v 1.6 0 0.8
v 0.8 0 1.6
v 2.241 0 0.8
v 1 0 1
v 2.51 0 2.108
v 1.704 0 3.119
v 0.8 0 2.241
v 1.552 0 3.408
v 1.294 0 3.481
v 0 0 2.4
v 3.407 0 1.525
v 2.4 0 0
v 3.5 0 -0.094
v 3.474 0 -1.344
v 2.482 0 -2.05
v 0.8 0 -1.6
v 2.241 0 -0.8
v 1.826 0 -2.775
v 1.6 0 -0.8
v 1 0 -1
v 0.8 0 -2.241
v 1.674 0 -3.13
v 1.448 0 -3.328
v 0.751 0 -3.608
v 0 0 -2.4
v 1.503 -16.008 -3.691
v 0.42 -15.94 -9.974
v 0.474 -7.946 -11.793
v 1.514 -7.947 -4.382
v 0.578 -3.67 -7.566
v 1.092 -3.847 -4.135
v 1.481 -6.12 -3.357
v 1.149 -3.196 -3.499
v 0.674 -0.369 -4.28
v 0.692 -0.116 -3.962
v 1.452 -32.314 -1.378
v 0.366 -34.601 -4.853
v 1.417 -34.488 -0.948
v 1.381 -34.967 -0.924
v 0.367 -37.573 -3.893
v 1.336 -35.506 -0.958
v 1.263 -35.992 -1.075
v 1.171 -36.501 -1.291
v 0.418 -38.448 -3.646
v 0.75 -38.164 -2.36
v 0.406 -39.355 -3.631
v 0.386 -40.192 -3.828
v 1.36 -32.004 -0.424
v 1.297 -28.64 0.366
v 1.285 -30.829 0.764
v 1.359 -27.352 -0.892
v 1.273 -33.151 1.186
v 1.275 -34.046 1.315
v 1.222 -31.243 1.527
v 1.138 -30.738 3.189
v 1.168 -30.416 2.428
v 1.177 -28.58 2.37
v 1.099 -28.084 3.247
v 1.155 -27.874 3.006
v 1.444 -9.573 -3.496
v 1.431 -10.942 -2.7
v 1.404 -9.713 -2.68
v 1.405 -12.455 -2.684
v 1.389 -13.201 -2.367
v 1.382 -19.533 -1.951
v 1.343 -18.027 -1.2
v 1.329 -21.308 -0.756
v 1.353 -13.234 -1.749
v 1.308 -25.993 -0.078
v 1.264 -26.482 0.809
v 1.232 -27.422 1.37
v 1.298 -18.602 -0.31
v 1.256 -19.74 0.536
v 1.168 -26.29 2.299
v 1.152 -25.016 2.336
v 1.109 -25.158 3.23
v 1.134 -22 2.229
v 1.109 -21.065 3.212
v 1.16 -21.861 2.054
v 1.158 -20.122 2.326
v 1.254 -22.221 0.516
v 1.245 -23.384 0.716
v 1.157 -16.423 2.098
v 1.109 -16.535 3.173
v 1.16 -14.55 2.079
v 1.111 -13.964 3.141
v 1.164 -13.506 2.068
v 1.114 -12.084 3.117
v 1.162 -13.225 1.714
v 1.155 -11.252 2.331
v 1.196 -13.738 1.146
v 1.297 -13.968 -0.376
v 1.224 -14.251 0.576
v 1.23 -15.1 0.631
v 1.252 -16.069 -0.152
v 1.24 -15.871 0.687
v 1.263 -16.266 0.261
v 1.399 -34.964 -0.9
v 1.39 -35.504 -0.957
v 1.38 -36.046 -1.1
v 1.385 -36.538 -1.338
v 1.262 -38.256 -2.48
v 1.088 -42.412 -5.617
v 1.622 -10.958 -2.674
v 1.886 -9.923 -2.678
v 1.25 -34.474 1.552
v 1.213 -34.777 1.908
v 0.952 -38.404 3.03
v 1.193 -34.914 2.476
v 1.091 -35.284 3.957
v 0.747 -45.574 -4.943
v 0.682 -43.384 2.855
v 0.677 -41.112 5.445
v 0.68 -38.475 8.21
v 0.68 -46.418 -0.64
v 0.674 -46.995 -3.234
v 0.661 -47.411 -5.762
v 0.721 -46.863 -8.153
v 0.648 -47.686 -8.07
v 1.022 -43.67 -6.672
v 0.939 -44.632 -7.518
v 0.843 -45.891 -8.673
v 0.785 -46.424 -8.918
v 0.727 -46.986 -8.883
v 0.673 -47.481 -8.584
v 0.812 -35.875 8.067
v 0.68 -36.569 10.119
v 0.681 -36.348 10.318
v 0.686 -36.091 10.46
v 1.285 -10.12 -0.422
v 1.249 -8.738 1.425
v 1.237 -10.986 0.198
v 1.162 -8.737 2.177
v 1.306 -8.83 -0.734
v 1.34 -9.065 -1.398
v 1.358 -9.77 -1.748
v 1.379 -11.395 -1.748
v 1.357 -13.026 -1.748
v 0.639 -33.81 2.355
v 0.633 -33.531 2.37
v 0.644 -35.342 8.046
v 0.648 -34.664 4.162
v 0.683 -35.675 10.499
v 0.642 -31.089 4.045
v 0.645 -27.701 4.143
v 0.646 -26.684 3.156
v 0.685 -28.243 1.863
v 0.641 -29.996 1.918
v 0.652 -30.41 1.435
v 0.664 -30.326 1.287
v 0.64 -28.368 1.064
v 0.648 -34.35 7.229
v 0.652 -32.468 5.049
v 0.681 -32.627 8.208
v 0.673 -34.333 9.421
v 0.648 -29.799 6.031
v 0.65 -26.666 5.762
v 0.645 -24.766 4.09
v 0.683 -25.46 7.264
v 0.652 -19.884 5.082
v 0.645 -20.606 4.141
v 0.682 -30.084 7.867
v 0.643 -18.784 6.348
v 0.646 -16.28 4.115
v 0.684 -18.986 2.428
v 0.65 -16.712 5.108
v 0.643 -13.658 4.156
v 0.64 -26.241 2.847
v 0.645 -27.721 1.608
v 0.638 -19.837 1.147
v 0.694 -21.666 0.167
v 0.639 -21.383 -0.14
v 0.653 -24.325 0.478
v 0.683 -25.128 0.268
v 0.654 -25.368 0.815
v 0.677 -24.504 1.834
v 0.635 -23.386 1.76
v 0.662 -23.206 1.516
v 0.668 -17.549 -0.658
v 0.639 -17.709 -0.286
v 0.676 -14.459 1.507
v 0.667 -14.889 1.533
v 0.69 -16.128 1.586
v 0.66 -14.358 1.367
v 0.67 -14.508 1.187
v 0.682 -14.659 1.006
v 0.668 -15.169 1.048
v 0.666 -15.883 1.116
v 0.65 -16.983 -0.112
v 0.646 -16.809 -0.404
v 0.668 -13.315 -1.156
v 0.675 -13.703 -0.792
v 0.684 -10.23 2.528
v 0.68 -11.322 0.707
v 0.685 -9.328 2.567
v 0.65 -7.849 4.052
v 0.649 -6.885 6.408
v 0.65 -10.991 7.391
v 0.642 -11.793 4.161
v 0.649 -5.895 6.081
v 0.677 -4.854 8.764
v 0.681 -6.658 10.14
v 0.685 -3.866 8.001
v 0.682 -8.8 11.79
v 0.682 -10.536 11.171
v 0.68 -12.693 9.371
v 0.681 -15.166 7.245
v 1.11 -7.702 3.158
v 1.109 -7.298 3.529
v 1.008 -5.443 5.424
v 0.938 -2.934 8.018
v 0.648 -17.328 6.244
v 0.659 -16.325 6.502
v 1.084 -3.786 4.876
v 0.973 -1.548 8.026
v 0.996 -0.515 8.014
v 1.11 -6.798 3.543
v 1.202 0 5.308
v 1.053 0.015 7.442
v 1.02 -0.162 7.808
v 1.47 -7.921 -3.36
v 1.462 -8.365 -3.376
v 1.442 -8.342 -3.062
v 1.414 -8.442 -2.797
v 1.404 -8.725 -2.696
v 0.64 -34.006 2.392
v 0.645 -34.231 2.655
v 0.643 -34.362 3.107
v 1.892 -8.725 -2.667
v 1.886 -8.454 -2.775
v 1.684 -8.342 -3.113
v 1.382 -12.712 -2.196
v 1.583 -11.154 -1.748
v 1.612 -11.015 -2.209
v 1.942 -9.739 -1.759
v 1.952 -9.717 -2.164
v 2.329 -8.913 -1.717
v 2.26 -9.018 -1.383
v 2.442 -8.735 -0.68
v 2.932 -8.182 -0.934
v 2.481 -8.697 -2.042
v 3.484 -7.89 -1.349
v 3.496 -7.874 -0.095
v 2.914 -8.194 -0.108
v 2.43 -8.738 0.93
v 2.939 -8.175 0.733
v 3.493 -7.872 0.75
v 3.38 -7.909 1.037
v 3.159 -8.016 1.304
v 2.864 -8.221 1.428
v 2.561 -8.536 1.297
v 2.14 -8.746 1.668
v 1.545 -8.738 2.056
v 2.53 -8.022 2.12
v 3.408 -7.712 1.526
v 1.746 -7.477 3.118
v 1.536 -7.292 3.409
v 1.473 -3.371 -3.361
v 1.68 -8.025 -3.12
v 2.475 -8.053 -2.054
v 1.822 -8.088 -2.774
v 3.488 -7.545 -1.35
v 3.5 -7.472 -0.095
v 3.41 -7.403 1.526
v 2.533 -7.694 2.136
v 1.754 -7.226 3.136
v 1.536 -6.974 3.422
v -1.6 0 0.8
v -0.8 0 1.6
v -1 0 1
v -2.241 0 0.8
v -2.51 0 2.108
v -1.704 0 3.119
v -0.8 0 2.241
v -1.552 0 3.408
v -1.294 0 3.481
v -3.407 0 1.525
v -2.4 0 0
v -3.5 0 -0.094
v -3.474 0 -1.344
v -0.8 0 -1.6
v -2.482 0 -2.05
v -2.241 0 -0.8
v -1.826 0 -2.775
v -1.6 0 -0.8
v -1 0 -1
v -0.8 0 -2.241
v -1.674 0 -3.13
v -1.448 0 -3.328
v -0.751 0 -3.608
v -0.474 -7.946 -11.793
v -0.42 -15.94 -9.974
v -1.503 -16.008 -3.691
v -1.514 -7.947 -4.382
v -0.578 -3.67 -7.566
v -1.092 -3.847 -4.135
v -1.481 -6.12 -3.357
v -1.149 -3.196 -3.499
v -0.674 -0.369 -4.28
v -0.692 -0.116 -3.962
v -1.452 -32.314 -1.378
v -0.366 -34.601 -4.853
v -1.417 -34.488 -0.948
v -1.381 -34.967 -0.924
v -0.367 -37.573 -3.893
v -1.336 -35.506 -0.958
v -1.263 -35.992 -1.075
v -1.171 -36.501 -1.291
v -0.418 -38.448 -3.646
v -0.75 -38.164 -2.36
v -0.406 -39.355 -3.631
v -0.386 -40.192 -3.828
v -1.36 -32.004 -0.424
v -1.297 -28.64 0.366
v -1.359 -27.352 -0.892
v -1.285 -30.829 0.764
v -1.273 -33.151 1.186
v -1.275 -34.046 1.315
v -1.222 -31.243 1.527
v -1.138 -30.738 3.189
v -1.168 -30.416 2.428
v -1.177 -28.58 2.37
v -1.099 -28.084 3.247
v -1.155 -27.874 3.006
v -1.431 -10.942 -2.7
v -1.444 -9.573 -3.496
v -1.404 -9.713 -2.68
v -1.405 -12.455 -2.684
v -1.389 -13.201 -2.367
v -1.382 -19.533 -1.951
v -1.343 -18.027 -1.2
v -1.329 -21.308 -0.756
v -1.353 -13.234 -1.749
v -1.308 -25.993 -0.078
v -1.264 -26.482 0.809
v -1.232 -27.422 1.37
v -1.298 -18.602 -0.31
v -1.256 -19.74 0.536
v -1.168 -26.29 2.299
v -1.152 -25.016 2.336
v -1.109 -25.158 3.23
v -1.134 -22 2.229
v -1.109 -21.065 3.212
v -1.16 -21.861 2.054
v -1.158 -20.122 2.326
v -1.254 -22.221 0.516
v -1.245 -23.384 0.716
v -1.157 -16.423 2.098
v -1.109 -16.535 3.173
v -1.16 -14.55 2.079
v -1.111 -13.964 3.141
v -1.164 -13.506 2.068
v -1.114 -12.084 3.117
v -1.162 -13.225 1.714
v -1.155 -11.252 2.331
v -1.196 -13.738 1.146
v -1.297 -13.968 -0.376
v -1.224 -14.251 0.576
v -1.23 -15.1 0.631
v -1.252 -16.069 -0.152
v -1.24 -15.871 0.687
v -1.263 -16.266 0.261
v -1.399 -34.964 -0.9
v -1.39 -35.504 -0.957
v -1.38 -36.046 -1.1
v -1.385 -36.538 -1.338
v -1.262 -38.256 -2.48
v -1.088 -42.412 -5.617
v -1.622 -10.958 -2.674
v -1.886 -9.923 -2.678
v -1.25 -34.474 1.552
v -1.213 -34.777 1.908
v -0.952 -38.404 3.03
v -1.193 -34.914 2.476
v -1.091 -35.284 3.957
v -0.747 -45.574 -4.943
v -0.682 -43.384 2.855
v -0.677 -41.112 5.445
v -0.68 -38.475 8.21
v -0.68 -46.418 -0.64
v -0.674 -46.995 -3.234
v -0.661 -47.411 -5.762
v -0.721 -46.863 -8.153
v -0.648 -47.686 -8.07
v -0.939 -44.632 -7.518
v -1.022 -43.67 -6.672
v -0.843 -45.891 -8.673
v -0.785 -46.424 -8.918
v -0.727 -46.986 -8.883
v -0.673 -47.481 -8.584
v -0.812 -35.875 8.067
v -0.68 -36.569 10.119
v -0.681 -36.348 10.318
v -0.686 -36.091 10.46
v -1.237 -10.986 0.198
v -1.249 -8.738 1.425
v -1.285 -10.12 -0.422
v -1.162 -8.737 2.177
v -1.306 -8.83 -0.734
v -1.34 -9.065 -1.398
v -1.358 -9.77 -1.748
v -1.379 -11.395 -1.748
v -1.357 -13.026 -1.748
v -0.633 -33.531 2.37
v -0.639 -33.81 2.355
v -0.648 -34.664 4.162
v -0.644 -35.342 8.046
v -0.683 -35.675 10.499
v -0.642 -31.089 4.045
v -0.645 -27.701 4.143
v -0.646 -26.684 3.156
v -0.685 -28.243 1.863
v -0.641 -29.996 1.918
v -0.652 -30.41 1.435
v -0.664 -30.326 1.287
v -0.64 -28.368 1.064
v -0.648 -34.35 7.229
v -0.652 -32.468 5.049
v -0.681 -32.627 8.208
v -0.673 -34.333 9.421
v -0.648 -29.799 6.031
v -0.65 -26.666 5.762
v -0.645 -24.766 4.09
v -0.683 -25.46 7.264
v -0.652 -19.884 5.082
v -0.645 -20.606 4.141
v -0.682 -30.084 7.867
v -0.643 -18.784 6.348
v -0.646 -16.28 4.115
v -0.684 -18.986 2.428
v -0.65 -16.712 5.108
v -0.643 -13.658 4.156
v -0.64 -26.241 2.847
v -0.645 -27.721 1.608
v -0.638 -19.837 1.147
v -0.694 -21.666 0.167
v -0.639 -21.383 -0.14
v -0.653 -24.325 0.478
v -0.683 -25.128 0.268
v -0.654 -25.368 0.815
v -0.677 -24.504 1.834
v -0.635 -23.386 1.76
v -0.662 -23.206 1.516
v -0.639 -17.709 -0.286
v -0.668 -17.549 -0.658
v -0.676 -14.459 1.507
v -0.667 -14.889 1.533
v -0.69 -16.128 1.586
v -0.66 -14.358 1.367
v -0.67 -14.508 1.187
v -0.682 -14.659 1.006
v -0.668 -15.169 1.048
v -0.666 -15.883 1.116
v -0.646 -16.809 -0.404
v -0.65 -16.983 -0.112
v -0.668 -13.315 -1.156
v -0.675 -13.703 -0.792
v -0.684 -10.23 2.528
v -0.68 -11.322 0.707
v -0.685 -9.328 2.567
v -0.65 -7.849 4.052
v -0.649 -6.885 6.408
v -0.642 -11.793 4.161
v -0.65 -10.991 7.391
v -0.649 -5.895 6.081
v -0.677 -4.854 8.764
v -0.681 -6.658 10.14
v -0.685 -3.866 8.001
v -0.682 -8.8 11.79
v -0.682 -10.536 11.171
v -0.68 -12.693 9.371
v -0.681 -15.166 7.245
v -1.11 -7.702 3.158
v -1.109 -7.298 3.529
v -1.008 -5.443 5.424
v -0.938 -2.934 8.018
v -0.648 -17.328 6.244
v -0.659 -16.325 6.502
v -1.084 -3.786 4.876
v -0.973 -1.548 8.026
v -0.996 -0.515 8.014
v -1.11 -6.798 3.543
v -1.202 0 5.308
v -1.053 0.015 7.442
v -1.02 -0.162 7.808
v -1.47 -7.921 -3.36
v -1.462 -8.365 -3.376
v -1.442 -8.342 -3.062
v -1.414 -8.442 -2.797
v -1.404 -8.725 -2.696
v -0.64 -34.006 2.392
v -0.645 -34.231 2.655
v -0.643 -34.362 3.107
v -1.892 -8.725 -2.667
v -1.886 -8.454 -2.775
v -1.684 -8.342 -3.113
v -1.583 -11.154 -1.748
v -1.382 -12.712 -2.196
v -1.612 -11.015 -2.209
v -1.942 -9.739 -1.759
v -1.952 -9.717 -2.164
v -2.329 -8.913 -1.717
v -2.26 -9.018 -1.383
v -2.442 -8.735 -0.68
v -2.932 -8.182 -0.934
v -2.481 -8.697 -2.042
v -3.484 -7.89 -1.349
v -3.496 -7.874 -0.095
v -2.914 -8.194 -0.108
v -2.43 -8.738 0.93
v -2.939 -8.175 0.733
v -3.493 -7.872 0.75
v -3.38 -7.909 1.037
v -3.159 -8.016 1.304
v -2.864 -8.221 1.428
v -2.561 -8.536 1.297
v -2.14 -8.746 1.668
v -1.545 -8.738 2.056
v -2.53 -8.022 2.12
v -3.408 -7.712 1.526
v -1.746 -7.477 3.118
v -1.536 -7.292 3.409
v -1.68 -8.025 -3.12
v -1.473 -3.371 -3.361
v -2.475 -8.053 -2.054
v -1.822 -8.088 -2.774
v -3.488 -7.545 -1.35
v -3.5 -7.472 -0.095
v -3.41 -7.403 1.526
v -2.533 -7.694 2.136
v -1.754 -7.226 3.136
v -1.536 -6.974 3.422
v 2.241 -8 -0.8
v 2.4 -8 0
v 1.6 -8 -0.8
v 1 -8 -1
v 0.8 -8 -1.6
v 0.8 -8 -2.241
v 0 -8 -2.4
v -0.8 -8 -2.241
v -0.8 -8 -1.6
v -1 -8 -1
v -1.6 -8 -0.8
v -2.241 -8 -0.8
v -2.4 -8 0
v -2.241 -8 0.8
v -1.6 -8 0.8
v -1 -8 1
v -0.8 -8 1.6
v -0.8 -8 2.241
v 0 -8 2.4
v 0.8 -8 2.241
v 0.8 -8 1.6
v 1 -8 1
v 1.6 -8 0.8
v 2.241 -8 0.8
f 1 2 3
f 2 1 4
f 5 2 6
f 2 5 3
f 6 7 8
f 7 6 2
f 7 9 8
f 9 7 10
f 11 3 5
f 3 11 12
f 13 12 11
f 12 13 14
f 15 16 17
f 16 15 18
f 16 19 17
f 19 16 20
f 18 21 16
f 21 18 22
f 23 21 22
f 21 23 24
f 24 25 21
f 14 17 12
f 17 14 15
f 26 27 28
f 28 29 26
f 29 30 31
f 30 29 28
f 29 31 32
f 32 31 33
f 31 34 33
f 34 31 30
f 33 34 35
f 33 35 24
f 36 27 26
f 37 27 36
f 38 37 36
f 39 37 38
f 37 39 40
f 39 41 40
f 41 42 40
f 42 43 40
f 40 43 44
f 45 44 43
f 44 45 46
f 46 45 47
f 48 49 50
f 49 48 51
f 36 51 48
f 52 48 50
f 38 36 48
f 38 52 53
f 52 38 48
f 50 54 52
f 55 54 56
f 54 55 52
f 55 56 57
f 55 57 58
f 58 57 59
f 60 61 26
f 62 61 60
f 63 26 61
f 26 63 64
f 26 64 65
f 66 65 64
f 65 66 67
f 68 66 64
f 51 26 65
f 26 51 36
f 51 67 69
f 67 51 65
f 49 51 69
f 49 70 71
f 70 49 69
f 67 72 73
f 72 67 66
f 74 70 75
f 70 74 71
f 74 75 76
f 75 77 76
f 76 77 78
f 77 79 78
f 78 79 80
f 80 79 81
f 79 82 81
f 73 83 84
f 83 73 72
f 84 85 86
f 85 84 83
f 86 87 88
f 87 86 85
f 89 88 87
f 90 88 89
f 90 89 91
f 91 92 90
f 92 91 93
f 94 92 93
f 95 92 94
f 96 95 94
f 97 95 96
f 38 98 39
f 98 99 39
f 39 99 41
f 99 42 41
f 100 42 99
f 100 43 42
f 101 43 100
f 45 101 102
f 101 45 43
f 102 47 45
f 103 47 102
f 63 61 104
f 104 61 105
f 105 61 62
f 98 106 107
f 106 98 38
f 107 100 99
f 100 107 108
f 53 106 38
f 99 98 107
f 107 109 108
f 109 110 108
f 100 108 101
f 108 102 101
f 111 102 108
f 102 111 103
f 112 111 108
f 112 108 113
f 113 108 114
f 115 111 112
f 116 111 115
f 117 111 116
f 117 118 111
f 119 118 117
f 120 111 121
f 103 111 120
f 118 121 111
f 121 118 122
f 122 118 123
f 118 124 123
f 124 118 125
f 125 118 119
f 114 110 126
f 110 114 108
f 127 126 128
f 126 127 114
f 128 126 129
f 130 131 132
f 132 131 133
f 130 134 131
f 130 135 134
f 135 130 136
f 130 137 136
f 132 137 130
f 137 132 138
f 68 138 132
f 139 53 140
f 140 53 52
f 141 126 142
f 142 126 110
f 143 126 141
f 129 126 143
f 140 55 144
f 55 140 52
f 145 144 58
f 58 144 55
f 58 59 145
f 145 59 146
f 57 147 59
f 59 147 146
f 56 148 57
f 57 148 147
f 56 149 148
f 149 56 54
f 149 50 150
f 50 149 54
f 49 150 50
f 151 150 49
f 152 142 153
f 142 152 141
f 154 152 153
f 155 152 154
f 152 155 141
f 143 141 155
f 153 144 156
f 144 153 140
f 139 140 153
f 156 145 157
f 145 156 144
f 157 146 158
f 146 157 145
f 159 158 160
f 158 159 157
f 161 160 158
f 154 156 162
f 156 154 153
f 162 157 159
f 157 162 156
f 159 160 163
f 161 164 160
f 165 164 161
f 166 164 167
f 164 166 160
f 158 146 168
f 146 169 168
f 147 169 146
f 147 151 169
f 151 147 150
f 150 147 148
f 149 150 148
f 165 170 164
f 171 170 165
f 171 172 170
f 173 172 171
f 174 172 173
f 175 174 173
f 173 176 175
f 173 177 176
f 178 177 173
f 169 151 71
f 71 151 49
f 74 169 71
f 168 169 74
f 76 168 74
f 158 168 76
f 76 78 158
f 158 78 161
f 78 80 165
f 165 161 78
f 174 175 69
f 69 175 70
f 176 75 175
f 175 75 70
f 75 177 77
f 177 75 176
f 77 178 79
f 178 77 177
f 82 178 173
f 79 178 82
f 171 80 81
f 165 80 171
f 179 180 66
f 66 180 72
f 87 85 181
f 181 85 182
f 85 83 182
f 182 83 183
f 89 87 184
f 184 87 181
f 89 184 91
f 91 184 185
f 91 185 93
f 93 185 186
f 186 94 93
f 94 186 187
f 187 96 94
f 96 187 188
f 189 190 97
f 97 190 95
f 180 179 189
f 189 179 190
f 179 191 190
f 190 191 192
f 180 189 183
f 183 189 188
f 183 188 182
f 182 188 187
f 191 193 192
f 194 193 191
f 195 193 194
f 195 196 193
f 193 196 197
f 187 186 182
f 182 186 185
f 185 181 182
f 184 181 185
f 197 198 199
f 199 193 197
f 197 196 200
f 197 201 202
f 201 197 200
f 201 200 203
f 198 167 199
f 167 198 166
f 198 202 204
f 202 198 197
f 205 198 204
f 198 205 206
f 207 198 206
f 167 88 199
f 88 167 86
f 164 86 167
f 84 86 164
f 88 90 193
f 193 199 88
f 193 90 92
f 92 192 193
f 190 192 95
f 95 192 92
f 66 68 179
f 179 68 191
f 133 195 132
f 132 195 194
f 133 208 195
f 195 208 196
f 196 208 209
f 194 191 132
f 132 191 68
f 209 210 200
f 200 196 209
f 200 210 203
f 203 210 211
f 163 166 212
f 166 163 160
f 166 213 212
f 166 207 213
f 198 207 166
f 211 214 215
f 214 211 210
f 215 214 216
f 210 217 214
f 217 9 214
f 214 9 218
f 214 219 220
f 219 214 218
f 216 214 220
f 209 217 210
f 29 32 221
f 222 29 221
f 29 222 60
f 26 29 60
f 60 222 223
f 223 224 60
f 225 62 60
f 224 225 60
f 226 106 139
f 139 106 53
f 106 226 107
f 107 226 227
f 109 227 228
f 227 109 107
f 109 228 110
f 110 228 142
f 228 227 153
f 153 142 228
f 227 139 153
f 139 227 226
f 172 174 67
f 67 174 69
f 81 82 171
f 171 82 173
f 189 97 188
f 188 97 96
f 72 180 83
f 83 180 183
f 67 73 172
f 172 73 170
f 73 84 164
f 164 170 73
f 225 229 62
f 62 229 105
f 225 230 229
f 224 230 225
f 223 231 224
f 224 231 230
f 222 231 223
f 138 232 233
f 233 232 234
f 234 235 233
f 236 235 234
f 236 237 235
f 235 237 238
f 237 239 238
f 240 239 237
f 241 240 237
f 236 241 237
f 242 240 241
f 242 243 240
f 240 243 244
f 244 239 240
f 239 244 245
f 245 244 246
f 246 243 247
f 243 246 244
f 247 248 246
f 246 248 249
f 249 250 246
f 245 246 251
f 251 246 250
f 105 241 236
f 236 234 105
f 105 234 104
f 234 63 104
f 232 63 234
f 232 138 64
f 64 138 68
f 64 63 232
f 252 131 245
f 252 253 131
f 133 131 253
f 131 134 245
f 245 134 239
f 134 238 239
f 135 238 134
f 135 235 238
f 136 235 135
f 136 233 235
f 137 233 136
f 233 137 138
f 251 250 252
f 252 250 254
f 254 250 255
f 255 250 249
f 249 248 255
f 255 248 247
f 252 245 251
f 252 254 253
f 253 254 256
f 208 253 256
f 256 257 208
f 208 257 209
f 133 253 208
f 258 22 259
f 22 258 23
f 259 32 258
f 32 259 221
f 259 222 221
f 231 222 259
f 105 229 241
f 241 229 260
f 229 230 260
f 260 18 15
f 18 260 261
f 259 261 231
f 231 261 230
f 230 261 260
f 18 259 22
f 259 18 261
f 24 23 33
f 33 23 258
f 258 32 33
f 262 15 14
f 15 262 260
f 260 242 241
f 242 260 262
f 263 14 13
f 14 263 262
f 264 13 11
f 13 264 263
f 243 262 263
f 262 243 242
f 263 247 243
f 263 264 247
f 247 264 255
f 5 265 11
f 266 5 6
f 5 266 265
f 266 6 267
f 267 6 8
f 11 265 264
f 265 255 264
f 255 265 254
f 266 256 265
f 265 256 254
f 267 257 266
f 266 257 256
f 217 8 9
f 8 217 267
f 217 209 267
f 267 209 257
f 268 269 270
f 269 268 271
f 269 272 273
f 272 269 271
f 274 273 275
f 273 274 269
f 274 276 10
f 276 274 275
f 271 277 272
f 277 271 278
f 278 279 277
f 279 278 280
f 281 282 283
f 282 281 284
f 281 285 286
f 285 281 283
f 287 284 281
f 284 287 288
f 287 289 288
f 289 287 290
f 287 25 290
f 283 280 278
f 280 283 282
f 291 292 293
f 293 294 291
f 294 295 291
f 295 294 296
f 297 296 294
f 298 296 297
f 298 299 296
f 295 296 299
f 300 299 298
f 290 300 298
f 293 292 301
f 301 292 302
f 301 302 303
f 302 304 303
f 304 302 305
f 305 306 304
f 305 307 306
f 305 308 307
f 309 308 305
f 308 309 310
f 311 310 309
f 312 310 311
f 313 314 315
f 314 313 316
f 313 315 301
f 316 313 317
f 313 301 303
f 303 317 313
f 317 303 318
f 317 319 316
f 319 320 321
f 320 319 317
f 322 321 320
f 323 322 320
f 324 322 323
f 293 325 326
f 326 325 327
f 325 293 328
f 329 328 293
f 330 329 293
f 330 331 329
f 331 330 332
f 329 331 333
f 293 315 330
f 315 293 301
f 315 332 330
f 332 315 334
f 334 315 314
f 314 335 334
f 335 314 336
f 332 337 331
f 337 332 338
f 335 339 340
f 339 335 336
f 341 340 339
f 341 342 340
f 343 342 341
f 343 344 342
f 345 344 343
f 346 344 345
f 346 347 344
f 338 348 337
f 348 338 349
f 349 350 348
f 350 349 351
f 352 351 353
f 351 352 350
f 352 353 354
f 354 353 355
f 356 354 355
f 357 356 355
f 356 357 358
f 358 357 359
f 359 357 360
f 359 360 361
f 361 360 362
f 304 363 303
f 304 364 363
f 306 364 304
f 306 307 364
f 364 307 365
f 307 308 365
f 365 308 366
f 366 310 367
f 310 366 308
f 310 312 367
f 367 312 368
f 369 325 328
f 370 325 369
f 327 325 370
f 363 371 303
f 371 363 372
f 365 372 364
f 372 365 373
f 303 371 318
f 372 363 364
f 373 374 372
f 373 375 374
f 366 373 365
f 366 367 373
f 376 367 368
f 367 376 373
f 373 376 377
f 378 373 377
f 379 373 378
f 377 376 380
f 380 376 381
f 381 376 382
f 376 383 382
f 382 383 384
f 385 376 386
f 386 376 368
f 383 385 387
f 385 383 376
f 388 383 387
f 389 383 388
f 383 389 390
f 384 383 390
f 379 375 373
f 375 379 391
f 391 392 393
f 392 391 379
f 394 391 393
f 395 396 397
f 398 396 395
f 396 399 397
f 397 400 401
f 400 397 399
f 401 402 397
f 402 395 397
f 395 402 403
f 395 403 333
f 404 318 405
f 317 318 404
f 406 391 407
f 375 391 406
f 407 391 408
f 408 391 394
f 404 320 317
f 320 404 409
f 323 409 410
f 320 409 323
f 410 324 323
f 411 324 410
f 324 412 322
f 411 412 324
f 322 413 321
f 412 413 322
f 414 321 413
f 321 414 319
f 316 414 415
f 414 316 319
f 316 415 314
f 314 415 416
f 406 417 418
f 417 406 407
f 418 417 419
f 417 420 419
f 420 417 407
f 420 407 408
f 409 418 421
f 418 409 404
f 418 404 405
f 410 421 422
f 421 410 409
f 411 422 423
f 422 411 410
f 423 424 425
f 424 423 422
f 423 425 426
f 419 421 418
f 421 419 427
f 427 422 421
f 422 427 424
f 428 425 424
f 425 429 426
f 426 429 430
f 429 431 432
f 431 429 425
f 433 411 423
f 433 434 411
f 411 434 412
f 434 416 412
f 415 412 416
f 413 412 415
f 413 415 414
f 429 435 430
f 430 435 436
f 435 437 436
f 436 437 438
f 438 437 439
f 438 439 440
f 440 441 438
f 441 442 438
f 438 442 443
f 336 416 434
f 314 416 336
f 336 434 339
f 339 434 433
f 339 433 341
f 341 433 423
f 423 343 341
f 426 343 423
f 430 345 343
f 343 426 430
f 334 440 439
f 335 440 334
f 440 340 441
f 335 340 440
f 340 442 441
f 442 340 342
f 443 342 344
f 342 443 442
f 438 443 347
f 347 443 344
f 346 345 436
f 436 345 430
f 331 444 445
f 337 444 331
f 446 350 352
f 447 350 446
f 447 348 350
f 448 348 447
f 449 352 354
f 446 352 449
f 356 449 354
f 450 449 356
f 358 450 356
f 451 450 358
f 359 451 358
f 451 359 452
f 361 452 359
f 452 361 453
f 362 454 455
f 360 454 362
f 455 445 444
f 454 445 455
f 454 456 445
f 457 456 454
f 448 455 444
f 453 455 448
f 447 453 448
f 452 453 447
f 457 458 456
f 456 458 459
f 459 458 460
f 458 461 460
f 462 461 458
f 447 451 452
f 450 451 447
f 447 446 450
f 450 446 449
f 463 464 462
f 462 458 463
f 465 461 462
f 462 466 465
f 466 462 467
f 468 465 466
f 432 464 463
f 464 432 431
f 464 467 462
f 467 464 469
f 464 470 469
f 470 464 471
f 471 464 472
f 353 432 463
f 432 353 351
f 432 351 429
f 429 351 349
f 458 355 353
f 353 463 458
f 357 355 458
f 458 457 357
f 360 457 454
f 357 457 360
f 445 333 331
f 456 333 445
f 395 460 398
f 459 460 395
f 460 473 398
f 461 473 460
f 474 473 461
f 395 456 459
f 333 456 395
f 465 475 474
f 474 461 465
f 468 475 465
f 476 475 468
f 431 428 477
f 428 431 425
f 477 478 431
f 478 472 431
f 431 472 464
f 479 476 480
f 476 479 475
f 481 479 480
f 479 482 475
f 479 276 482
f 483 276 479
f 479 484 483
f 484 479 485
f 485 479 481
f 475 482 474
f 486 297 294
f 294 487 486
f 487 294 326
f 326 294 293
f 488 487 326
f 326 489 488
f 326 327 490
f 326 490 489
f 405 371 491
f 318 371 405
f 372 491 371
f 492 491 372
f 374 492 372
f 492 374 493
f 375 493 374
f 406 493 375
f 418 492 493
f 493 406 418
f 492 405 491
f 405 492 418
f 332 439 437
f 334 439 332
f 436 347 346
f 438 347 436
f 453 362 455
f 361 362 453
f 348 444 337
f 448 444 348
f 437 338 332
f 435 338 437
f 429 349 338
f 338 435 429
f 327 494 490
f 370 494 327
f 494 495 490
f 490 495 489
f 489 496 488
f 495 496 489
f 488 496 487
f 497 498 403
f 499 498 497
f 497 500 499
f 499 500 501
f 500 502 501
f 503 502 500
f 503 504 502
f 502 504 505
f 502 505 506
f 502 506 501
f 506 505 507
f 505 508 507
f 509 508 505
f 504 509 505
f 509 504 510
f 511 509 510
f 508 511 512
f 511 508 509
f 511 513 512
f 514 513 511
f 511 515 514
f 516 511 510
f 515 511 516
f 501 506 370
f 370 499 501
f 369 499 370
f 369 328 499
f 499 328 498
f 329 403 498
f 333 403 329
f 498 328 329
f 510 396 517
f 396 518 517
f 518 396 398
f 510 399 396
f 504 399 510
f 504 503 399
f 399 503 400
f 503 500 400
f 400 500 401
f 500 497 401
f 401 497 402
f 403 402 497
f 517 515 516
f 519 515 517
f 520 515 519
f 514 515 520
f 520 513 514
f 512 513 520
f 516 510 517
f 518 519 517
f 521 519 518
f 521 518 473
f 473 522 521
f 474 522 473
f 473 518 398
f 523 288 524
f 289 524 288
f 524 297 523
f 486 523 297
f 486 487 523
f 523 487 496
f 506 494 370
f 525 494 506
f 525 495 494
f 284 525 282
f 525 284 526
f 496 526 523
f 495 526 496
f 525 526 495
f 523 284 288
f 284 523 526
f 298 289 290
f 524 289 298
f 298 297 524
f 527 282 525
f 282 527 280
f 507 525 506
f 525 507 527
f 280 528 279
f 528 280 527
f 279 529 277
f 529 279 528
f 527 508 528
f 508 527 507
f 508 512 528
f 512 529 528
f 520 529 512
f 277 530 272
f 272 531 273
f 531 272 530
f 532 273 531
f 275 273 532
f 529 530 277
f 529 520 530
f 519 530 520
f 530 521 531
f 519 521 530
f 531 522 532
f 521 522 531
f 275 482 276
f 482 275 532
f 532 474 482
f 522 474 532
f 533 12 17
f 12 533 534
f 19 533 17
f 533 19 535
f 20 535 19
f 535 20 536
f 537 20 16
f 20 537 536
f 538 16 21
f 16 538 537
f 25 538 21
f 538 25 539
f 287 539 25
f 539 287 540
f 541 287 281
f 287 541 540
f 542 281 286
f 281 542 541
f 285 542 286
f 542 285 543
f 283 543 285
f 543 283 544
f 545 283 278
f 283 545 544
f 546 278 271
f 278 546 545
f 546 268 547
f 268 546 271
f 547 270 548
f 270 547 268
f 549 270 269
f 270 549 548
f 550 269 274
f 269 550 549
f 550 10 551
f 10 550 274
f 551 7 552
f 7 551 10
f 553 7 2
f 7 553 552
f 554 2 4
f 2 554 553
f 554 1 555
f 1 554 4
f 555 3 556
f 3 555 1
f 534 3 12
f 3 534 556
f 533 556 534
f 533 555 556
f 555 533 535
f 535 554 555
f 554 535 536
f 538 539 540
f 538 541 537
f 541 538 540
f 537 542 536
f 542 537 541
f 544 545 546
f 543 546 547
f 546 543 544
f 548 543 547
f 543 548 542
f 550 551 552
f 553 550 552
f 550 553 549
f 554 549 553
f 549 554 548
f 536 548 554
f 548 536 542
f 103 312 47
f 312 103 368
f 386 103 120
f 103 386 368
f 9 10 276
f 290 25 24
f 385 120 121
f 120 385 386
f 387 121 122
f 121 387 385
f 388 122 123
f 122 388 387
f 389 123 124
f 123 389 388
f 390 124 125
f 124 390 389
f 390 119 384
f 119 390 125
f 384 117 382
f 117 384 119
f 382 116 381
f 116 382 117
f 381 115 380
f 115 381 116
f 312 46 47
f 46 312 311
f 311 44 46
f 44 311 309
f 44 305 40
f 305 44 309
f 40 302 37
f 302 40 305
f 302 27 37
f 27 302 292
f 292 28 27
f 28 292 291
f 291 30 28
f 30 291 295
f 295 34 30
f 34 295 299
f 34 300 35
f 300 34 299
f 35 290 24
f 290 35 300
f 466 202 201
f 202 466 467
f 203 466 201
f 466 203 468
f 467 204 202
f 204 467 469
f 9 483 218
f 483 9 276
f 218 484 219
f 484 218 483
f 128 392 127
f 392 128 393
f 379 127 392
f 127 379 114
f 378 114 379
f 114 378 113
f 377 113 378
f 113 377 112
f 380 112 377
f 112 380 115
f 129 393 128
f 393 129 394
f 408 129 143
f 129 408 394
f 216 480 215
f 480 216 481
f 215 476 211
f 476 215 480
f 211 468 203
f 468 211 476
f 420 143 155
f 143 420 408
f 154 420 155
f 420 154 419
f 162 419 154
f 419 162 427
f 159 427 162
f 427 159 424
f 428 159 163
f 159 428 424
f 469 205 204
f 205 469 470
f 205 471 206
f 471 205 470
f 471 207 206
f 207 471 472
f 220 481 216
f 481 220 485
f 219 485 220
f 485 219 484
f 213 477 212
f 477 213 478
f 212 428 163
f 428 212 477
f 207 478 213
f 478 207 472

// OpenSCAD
use <../lib.scad>
use <../p/axl5end.scad>
use <../p/axl5hol8.scad>
use <../p/axl5hol9.scad>
use <../p/axlehol2.scad>
use <s/76919s01.scad>
function ldraw_lib__76919() = [
// 0 Constraction Blade 6L Jagged with Axle Hole
// 0 Name: 76919.dat
// 0 Author: Gerald Lasser [GeraldLasser]
// 0 !LDRAW_ORG Part UPDATE 2026-08
// 0 !LICENSE Licensed under CC BY 4.0 : see CAreadme.txt
// 
// 0 BFC CERTIFY CCW
  [0,"BFC","CERTIFY"],
  [0,"BFC","CCW"],
// 
// 0 !CATEGORY Constraction Accessory
// 
// 0 !HISTORY 2025-02-01 {LEGO Instructions App} Original part shape
// 0 !HISTORY 2025-09-01 [GeraldLasser] File preparation for LDraw Parts Tracker
// 0 !HISTORY 2026-08-31 [OrionP] Official Update 2026-08
// 
// 1 16 0 0 0 1 0 0 0 1 0 0 0 1 s\76919s01.dat
  [1,16,0,0,0,1,0,0,0,1,0,0,0,1, ldraw_lib__s__76919s01()],
// 1 16 0 0 0 -1 0 0 0 1 0 0 0 1 s\76919s01.dat
  [1,16,0,0,0,-1,0,0,0,1,0,0,0,1, ldraw_lib__s__76919s01()],
// 
// 1 16 0 0 0 1 0 0 0 0 1 0 -20 0 axl5hol8.dat
  [1,16,0,0,0,1,0,0,0,0,1,0,-20,0, ldraw_lib__axl5hol8()],
// 1 16 0 0 -20 1 0 0 0 0 1 0 -1 0 axl5end.dat
  [1,16,0,0,-20,1,0,0,0,0,1,0,-1,0, ldraw_lib__axl5end()],
// 1 16 0 0 -20 1 0 0 0 0 1 0 -1 0 axlehol2.dat
  [1,16,0,0,-20,1,0,0,0,0,1,0,-1,0, ldraw_lib__axlehol2()],
// 1 16 0 0 -20 1 0 0 0 0 1 0 -1 0 axl5hol9.dat
  [1,16,0,0,-20,1,0,0,0,0,1,0,-1,0, ldraw_lib__axl5hol9()],
// 1 16 0 0 0 1 0 0 0 0 1 0 -1 0 axl5hol9.dat
  [1,16,0,0,0,1,0,0,0,0,1,0,-1,0, ldraw_lib__axl5hol9()],
// 1 16 0 0 0 1 0 0 0 0 1 0 -1 0 axlehol2.dat
  [1,16,0,0,0,1,0,0,0,0,1,0,-1,0, ldraw_lib__axlehol2()],
// 
// 4 16 -2.719 14.042 -106.03 -.965 9.57 -100.479 .965 9.57 -100.479 2.719 14.042 -106.03
  [4,16,-2.719,14.042,-106.03,-.965,9.57,-100.479,.965,9.57,-100.479,2.719,14.042,-106.03],
// 4 16 2.556 16.679 -109.175 -2.556 16.679 -109.175 -2.719 14.042 -106.03 2.719 14.042 -106.03
  [4,16,2.556,16.679,-109.175,-2.556,16.679,-109.175,-2.719,14.042,-106.03,2.719,14.042,-106.03],
// 3 16 3.236 -8.703 0 0 -6 0 -3.236 -8.703 0
  [3,16,3.236,-8.703,0,0,-6,0,-3.236,-8.703,0],
// 3 16 -1.877 9.019 0 0 6 0 1.877 9.019 0
  [3,16,-1.877,9.019,0,0,6,0,1.877,9.019,0],
// 4 16 2.347 18.796 -111.581 -2.347 18.796 -111.581 -2.556 16.679 -109.175 2.556 16.679 -109.175
  [4,16,2.347,18.796,-111.581,-2.347,18.796,-111.581,-2.556,16.679,-109.175,2.556,16.679,-109.175],
// 4 16 2.108 21.682 -114.727 -2.108 21.682 -114.727 -2.347 18.796 -111.581 2.347 18.796 -111.581
  [4,16,2.108,21.682,-114.727,-2.108,21.682,-114.727,-2.347,18.796,-111.581,2.347,18.796,-111.581],
// 4 16 -2.108 21.682 -114.727 2.108 21.682 -114.727 1.963 22.294 -116.059 -1.963 22.294 -116.059
  [4,16,-2.108,21.682,-114.727,2.108,21.682,-114.727,1.963,22.294,-116.059,-1.963,22.294,-116.059],
// 4 16 1.818 22.208 -117.465 -1.818 22.208 -117.465 -1.963 22.294 -116.059 1.963 22.294 -116.059
  [4,16,1.818,22.208,-117.465,-1.818,22.208,-117.465,-1.963,22.294,-116.059,1.963,22.294,-116.059],
// 4 16 -1.818 22.208 -117.465 1.818 22.208 -117.465 1.682 21.459 -118.703 -1.682 21.459 -118.703
  [4,16,-1.818,22.208,-117.465,1.818,22.208,-117.465,1.682,21.459,-118.703,-1.682,21.459,-118.703],
// 4 16 -1.682 21.459 -118.703 1.682 21.459 -118.703 1.619 20.176 -119.216 -1.619 20.176 -119.216
  [4,16,-1.682,21.459,-118.703,1.682,21.459,-118.703,1.619,20.176,-119.216,-1.619,20.176,-119.216],
// 4 16 -1.619 20.176 -119.216 1.619 20.176 -119.216 1.653 14.405 -118.528 -1.653 14.405 -118.528
  [4,16,-1.619,20.176,-119.216,1.619,20.176,-119.216,1.653,14.405,-118.528,-1.653,14.405,-118.528],
// 4 16 -1.653 14.405 -118.528 1.653 14.405 -118.528 1.684 8.085 -117.488 -1.684 8.085 -117.488
  [4,16,-1.653,14.405,-118.528,1.653,14.405,-118.528,1.684,8.085,-117.488,-1.684,8.085,-117.488],
// 4 16 1.701 1.6 -116.046 -1.701 1.6 -116.046 -1.684 8.085 -117.488 1.684 8.085 -117.488
  [4,16,1.701,1.6,-116.046,-1.701,1.6,-116.046,-1.684,8.085,-117.488,1.684,8.085,-117.488],
// 4 16 1.014 9.078 -98.387 .965 9.57 -100.479 -.965 9.57 -100.479 -1.014 9.078 -98.387
  [4,16,1.014,9.078,-98.387,.965,9.57,-100.479,-.965,9.57,-100.479,-1.014,9.078,-98.387],
// 4 16 -1.014 9.078 -98.387 -1.046 9.115 -96.121 1.046 9.115 -96.121 1.014 9.078 -98.387
  [4,16,-1.014,9.078,-98.387,-1.046,9.115,-96.121,1.046,9.115,-96.121,1.014,9.078,-98.387],
// 4 16 -1.046 9.115 -96.121 -.917 9.733 -93.933 .917 9.733 -93.933 1.046 9.115 -96.121
  [4,16,-1.046,9.115,-96.121,-.917,9.733,-93.933,.917,9.733,-93.933,1.046,9.115,-96.121],
// 4 16 -.917 9.733 -93.933 -.914 12.132 -86.502 .914 12.132 -86.502 .917 9.733 -93.933
  [4,16,-.917,9.733,-93.933,-.914,12.132,-86.502,.914,12.132,-86.502,.917,9.733,-93.933],
// 4 16 1.049 24.935 -39.851 .914 12.132 -86.502 -.914 12.132 -86.502 -1.049 24.935 -39.851
  [4,16,1.049,24.935,-39.851,.914,12.132,-86.502,-.914,12.132,-86.502,-1.049,24.935,-39.851],
// 4 16 1.184 29.482 -19.866 1.049 24.935 -39.851 -1.049 24.935 -39.851 -1.184 29.482 -19.866
  [4,16,1.184,29.482,-19.866,1.049,24.935,-39.851,-1.049,24.935,-39.851,-1.184,29.482,-19.866],
// 4 16 1.444 18.915 -9.174 1.184 29.482 -19.866 -1.184 29.482 -19.866 -1.444 18.915 -9.174
  [4,16,1.444,18.915,-9.174,1.184,29.482,-19.866,-1.184,29.482,-19.866,-1.444,18.915,-9.174],
// 4 16 -1.444 18.915 -9.174 -1.686 10.7 -.922 1.686 10.7 -.922 1.444 18.915 -9.174
  [4,16,-1.444,18.915,-9.174,-1.686,10.7,-.922,1.686,10.7,-.922,1.444,18.915,-9.174],
// 4 16 1.686 10.7 -.922 -1.686 10.7 -.922 -1.731 9.906 -.289 1.731 9.906 -.289
  [4,16,1.686,10.7,-.922,-1.686,10.7,-.922,-1.731,9.906,-.289,1.731,9.906,-.289],
// 4 16 -1.877 9.019 0 1.877 9.019 0 1.731 9.906 -.289 -1.731 9.906 -.289
  [4,16,-1.877,9.019,0,1.877,9.019,0,1.731,9.906,-.289,-1.731,9.906,-.289],
// 4 16 -1.692 -21.91 -12.135 -1.703 -25.349 -16.646 1.703 -25.349 -16.646 1.692 -21.91 -12.135
  [4,16,-1.692,-21.91,-12.135,-1.703,-25.349,-16.646,1.703,-25.349,-16.646,1.692,-21.91,-12.135],
// 4 16 -1.712 -20.002 -9.664 -1.692 -21.91 -12.135 1.692 -21.91 -12.135 1.712 -20.002 -9.664
  [4,16,-1.712,-20.002,-9.664,-1.692,-21.91,-12.135,1.692,-21.91,-12.135,1.712,-20.002,-9.664],
// 4 16 -1.704 -29.476 -21.999 1.704 -29.476 -21.999 1.703 -25.349 -16.646 -1.703 -25.349 -16.646
  [4,16,-1.704,-29.476,-21.999,1.704,-29.476,-21.999,1.703,-25.349,-16.646,-1.703,-25.349,-16.646],
// 4 16 3.005 -13.27 0 3.236 -8.703 0 -3.236 -8.703 0 -3.005 -13.27 0
  [4,16,3.005,-13.27,0,3.236,-8.703,0,-3.236,-8.703,0,-3.005,-13.27,0],
// 4 16 -3.005 -13.27 0 -2.633 -18.605 .037 2.633 -18.605 .037 3.005 -13.27 0
  [4,16,-3.005,-13.27,0,-2.633,-18.605,.037,2.633,-18.605,.037,3.005,-13.27,0],
// 4 16 1.703 -25.795 -90.871 -1.703 -25.795 -90.871 -1.7 -25.298 -91.423 1.7 -25.298 -91.423
  [4,16,1.703,-25.795,-90.871,-1.703,-25.795,-90.871,-1.7,-25.298,-91.423,1.7,-25.298,-91.423],
// 4 16 1.7 -25.298 -91.423 -1.7 -25.298 -91.423 -1.701 -20.525 -96.187 1.701 -20.525 -96.187
  [4,16,1.7,-25.298,-91.423,-1.7,-25.298,-91.423,-1.701,-20.525,-96.187,1.701,-20.525,-96.187],
// 4 16 1.701 -20.525 -96.187 -1.701 -20.525 -96.187 -1.693 -13.613 -102.78 1.693 -13.613 -102.78
  [4,16,1.701,-20.525,-96.187,-1.701,-20.525,-96.187,-1.693,-13.613,-102.78,1.693,-13.613,-102.78],
// 4 16 1.693 -13.613 -102.78 -1.693 -13.613 -102.78 -1.705 -7.137 -108.461 1.705 -7.137 -108.461
  [4,16,1.693,-13.613,-102.78,-1.693,-13.613,-102.78,-1.705,-7.137,-108.461,1.705,-7.137,-108.461],
// 4 16 -1.701 1.6 -116.046 1.701 1.6 -116.046 1.705 -7.137 -108.461 -1.705 -7.137 -108.461
  [4,16,-1.701,1.6,-116.046,1.701,1.6,-116.046,1.705,-7.137,-108.461,-1.705,-7.137,-108.461],
// 4 16 -1.703 -25.795 -90.871 1.703 -25.795 -90.871 1.714 -26.149 -90.227 -1.714 -26.149 -90.227
  [4,16,-1.703,-25.795,-90.871,1.703,-25.795,-90.871,1.714,-26.149,-90.227,-1.714,-26.149,-90.227],
// 4 16 -1.714 -26.149 -90.227 1.714 -26.149 -90.227 1.708 -26.248 -89.188 -1.708 -26.248 -89.188
  [4,16,-1.714,-26.149,-90.227,1.714,-26.149,-90.227,1.708,-26.248,-89.188,-1.708,-26.248,-89.188],
// 4 16 2.489 -20.035 -1.288 -2.489 -20.035 -1.288 -2.433 -20.066 -3.87 2.433 -20.066 -3.87
  [4,16,2.489,-20.035,-1.288,-2.489,-20.035,-1.288,-2.433,-20.066,-3.87,2.433,-20.066,-3.87],
// 4 16 2.433 -20.066 -3.87 -2.433 -20.066 -3.87 -2.346 -20.046 -7.335 2.346 -20.046 -7.335
  [4,16,2.433,-20.066,-3.87,-2.433,-20.066,-3.87,-2.346,-20.046,-7.335,2.346,-20.046,-7.335],
// 4 16 -1.712 -20.002 -9.664 1.712 -20.002 -9.664 2.346 -20.046 -7.335 -2.346 -20.046 -7.335
  [4,16,-1.712,-20.002,-9.664,1.712,-20.002,-9.664,2.346,-20.046,-7.335,-2.346,-20.046,-7.335],
// 4 16 -1.708 -26.248 -89.188 1.708 -26.248 -89.188 1.682 -23.552 -85.833 -1.682 -23.552 -85.833
  [4,16,-1.708,-26.248,-89.188,1.708,-26.248,-89.188,1.682,-23.552,-85.833,-1.682,-23.552,-85.833],
// 4 16 1.703 -20.521 -81.567 -1.703 -20.521 -81.567 -1.682 -23.552 -85.833 1.682 -23.552 -85.833
  [4,16,1.703,-20.521,-81.567,-1.703,-20.521,-81.567,-1.682,-23.552,-85.833,1.682,-23.552,-85.833],
// 4 16 1.704 -19.668 -75.209 -1.704 -19.668 -75.209 -1.703 -20.521 -81.567 1.703 -20.521 -81.567
  [4,16,1.704,-19.668,-75.209,-1.704,-19.668,-75.209,-1.703,-20.521,-81.567,1.703,-20.521,-81.567],
// 4 16 1.708 -18.16 -63.651 -1.708 -18.16 -63.651 -1.704 -19.668 -75.209 1.704 -19.668 -75.209
  [4,16,1.708,-18.16,-63.651,-1.708,-18.16,-63.651,-1.704,-19.668,-75.209,1.704,-19.668,-75.209],
// 4 16 -1.708 -18.16 -63.651 1.708 -18.16 -63.651 1.607 -15.871 -46.96 -1.607 -15.871 -46.96
  [4,16,-1.708,-18.16,-63.651,1.708,-18.16,-63.651,1.607,-15.871,-46.96,-1.607,-15.871,-46.96],
// 4 16 -1.704 -27.928 -26.341 1.704 -27.928 -26.341 1.704 -29.476 -21.999 -1.704 -29.476 -21.999
  [4,16,-1.704,-27.928,-26.341,1.704,-27.928,-26.341,1.704,-29.476,-21.999,-1.704,-29.476,-21.999],
// 4 16 1.704 -27.928 -26.341 -1.704 -27.928 -26.341 -1.699 -23.427 -31.732 1.699 -23.427 -31.732
  [4,16,1.704,-27.928,-26.341,-1.704,-27.928,-26.341,-1.699,-23.427,-31.732,1.699,-23.427,-31.732],
// 4 16 -1.702 -18.113 -37.916 1.702 -18.113 -37.916 1.699 -23.427 -31.732 -1.699 -23.427 -31.732
  [4,16,-1.702,-18.113,-37.916,1.702,-18.113,-37.916,1.699,-23.427,-31.732,-1.699,-23.427,-31.732],
// 4 16 2.55 -19.52 -.404 -2.55 -19.52 -.404 -2.489 -20.035 -1.288 2.489 -20.035 -1.288
  [4,16,2.55,-19.52,-.404,-2.55,-19.52,-.404,-2.489,-20.035,-1.288,2.489,-20.035,-1.288],
// 4 16 2.633 -18.605 .037 -2.633 -18.605 .037 -2.55 -19.52 -.404 2.55 -19.52 -.404
  [4,16,2.633,-18.605,.037,-2.633,-18.605,.037,-2.55,-19.52,-.404,2.55,-19.52,-.404],
// 4 16 1.647 -16.256 -40.813 -1.647 -16.256 -40.813 -1.62 -15.611 -43.32 1.62 -15.611 -43.32
  [4,16,1.647,-16.256,-40.813,-1.647,-16.256,-40.813,-1.62,-15.611,-43.32,1.62,-15.611,-43.32],
// 4 16 1.62 -15.611 -43.32 -1.62 -15.611 -43.32 -1.607 -15.871 -46.96 1.607 -15.871 -46.96
  [4,16,1.62,-15.611,-43.32,-1.62,-15.611,-43.32,-1.607,-15.871,-46.96,1.607,-15.871,-46.96],
// 4 16 -1.647 -16.256 -40.813 1.647 -16.256 -40.813 1.702 -18.113 -37.916 -1.702 -18.113 -37.916
  [4,16,-1.647,-16.256,-40.813,1.647,-16.256,-40.813,1.702,-18.113,-37.916,-1.702,-18.113,-37.916],
// 2 24 -.965 9.57 -100.479 .965 9.57 -100.479
  [2,24,-.965,9.57,-100.479,.965,9.57,-100.479],
// 2 24 1.701 1.6 -116.046 -1.701 1.6 -116.046
  [2,24,1.701,1.6,-116.046,-1.701,1.6,-116.046],
// 2 24 -1.184 29.482 -19.866 1.184 29.482 -19.866
  [2,24,-1.184,29.482,-19.866,1.184,29.482,-19.866],
// 2 24 1.712 -20.002 -9.664 -1.712 -20.002 -9.664
  [2,24,1.712,-20.002,-9.664,-1.712,-20.002,-9.664],
// 2 24 -1.704 -29.476 -21.999 1.704 -29.476 -21.999
  [2,24,-1.704,-29.476,-21.999,1.704,-29.476,-21.999],
// 2 24 1.708 -26.248 -89.188 -1.708 -26.248 -89.188
  [2,24,1.708,-26.248,-89.188,-1.708,-26.248,-89.188],
// 2 24 1.703 -20.521 -81.567 -1.703 -20.521 -81.567
  [2,24,1.703,-20.521,-81.567,-1.703,-20.521,-81.567],
// 2 24 -1.704 -27.928 -26.341 1.704 -27.928 -26.341
  [2,24,-1.704,-27.928,-26.341,1.704,-27.928,-26.341],
// 5 24 -2.433 -20.066 -3.87 2.433 -20.066 -3.87 2.489 -20.035 -1.288 -2.346 -20.046 -7.335
  [5,24,-2.433,-20.066,-3.87,2.433,-20.066,-3.87,2.489,-20.035,-1.288,-2.346,-20.046,-7.335],
// 5 24 -1.703 -25.349 -16.646 1.703 -25.349 -16.646 1.692 -21.91 -12.135 -1.704 -29.476 -21.999
  [5,24,-1.703,-25.349,-16.646,1.703,-25.349,-16.646,1.692,-21.91,-12.135,-1.704,-29.476,-21.999],
// 5 24 2.489 -20.035 -1.288 -2.489 -20.035 -1.288 2.55 -19.52 -.404 -2.433 -20.066 -3.87
  [5,24,2.489,-20.035,-1.288,-2.489,-20.035,-1.288,2.55,-19.52,-.404,-2.433,-20.066,-3.87],
// 5 24 -2.719 14.042 -106.03 2.719 14.042 -106.03 -.965 9.57 -100.479 2.556 16.679 -109.175
  [5,24,-2.719,14.042,-106.03,2.719,14.042,-106.03,-.965,9.57,-100.479,2.556,16.679,-109.175],
// 5 24 -1.705 -7.137 -108.461 1.705 -7.137 -108.461 1.693 -13.613 -102.78 -1.701 1.6 -116.046
  [5,24,-1.705,-7.137,-108.461,1.705,-7.137,-108.461,1.693,-13.613,-102.78,-1.701,1.6,-116.046],
// 5 24 1.684 8.085 -117.488 -1.684 8.085 -117.488 -1.653 14.405 -118.528 1.701 1.6 -116.046
  [5,24,1.684,8.085,-117.488,-1.684,8.085,-117.488,-1.653,14.405,-118.528,1.701,1.6,-116.046],
// 5 24 -1.7 -25.298 -91.423 1.7 -25.298 -91.423 -1.701 -20.525 -96.187 1.703 -25.795 -90.871
  [5,24,-1.7,-25.298,-91.423,1.7,-25.298,-91.423,-1.701,-20.525,-96.187,1.703,-25.795,-90.871],
// 5 24 1.708 -18.16 -63.651 -1.708 -18.16 -63.651 -1.704 -19.668 -75.209 1.607 -15.871 -46.96
  [5,24,1.708,-18.16,-63.651,-1.708,-18.16,-63.651,-1.704,-19.668,-75.209,1.607,-15.871,-46.96],
// 5 24 1.692 -21.91 -12.135 -1.692 -21.91 -12.135 1.712 -20.002 -9.664 -1.703 -25.349 -16.646
  [5,24,1.692,-21.91,-12.135,-1.692,-21.91,-12.135,1.712,-20.002,-9.664,-1.703,-25.349,-16.646],
// 5 24 2.55 -19.52 -.404 -2.55 -19.52 -.404 -2.489 -20.035 -1.288 2.633 -18.605 .037
  [5,24,2.55,-19.52,-.404,-2.55,-19.52,-.404,-2.489,-20.035,-1.288,2.633,-18.605,.037],
// 5 24 -1.701 -20.525 -96.187 1.701 -20.525 -96.187 -1.693 -13.613 -102.78 1.7 -25.298 -91.423
  [5,24,-1.701,-20.525,-96.187,1.701,-20.525,-96.187,-1.693,-13.613,-102.78,1.7,-25.298,-91.423],
// 5 24 2.556 16.679 -109.175 -2.556 16.679 -109.175 -2.719 14.042 -106.03 2.347 18.796 -111.581
  [5,24,2.556,16.679,-109.175,-2.556,16.679,-109.175,-2.719,14.042,-106.03,2.347,18.796,-111.581],
// 5 24 -1.693 -13.613 -102.78 1.693 -13.613 -102.78 -1.705 -7.137 -108.461 1.701 -20.525 -96.187
  [5,24,-1.693,-13.613,-102.78,1.693,-13.613,-102.78,-1.705,-7.137,-108.461,1.701,-20.525,-96.187],
// 5 24 1.682 21.459 -118.703 -1.682 21.459 -118.703 1.619 20.176 -119.216 -1.818 22.208 -117.465
  [5,24,1.682,21.459,-118.703,-1.682,21.459,-118.703,1.619,20.176,-119.216,-1.818,22.208,-117.465],
// 5 24 2.633 -18.605 .037 -2.633 -18.605 .037 -2.55 -19.52 -.404 3.005 -13.27 0
  [5,24,2.633,-18.605,.037,-2.633,-18.605,.037,-2.55,-19.52,-.404,3.005,-13.27,0],
// 5 24 -1.62 -15.611 -43.32 1.62 -15.611 -43.32 -1.607 -15.871 -46.96 1.647 -16.256 -40.813
  [5,24,-1.62,-15.611,-43.32,1.62,-15.611,-43.32,-1.607,-15.871,-46.96,1.647,-16.256,-40.813],
// 5 24 -1.686 10.7 -.922 1.686 10.7 -.922 -1.731 9.906 -.289 1.444 18.915 -9.174
  [5,24,-1.686,10.7,-.922,1.686,10.7,-.922,-1.731,9.906,-.289,1.444,18.915,-9.174],
// 5 24 -1.702 -18.113 -37.916 1.702 -18.113 -37.916 -1.647 -16.256 -40.813 1.699 -23.427 -31.732
  [5,24,-1.702,-18.113,-37.916,1.702,-18.113,-37.916,-1.647,-16.256,-40.813,1.699,-23.427,-31.732],
// 5 24 -.914 12.132 -86.502 .914 12.132 -86.502 .917 9.733 -93.933 -1.049 24.935 -39.851
  [5,24,-.914,12.132,-86.502,.914,12.132,-86.502,.917,9.733,-93.933,-1.049,24.935,-39.851],
// 5 24 1.607 -15.871 -46.96 -1.607 -15.871 -46.96 1.62 -15.611 -43.32 -1.708 -18.16 -63.651
  [5,24,1.607,-15.871,-46.96,-1.607,-15.871,-46.96,1.62,-15.611,-43.32,-1.708,-18.16,-63.651],
// 5 24 1.963 22.294 -116.059 -1.963 22.294 -116.059 -2.108 21.682 -114.727 1.818 22.208 -117.465
  [5,24,1.963,22.294,-116.059,-1.963,22.294,-116.059,-2.108,21.682,-114.727,1.818,22.208,-117.465],
// 5 24 2.347 18.796 -111.581 -2.347 18.796 -111.581 -2.556 16.679 -109.175 2.108 21.682 -114.727
  [5,24,2.347,18.796,-111.581,-2.347,18.796,-111.581,-2.556,16.679,-109.175,2.108,21.682,-114.727],
// 5 24 -1.049 24.935 -39.851 1.049 24.935 -39.851 -1.184 29.482 -19.866 .914 12.132 -86.502
  [5,24,-1.049,24.935,-39.851,1.049,24.935,-39.851,-1.184,29.482,-19.866,.914,12.132,-86.502],
// 5 24 -2.719 14.042 -106.03 -.965 9.57 -100.479 .965 9.57 -100.479 -3.156 6.199 -95.641
  [5,24,-2.719,14.042,-106.03,-.965,9.57,-100.479,.965,9.57,-100.479,-3.156,6.199,-95.641],
// 5 24 -1.444 18.915 -9.174 1.444 18.915 -9.174 -1.686 10.7 -.922 1.184 29.482 -19.866
  [5,24,-1.444,18.915,-9.174,1.444,18.915,-9.174,-1.686,10.7,-.922,1.184,29.482,-19.866],
// 5 24 2.108 21.682 -114.727 -2.108 21.682 -114.727 -2.347 18.796 -111.581 1.963 22.294 -116.059
  [5,24,2.108,21.682,-114.727,-2.108,21.682,-114.727,-2.347,18.796,-111.581,1.963,22.294,-116.059],
// 5 24 -.917 9.733 -93.933 .917 9.733 -93.933 -.914 12.132 -86.502 1.046 9.115 -96.121
  [5,24,-.917,9.733,-93.933,.917,9.733,-93.933,-.914,12.132,-86.502,1.046,9.115,-96.121],
// 5 24 -2.346 -20.046 -7.335 2.346 -20.046 -7.335 2.433 -20.066 -3.87 -1.712 -20.002 -9.664
  [5,24,-2.346,-20.046,-7.335,2.346,-20.046,-7.335,2.433,-20.066,-3.87,-1.712,-20.002,-9.664],
// 5 24 1.619 20.176 -119.216 -1.619 20.176 -119.216 1.653 14.405 -118.528 -1.682 21.459 -118.703
  [5,24,1.619,20.176,-119.216,-1.619,20.176,-119.216,1.653,14.405,-118.528,-1.682,21.459,-118.703],
// 5 24 2.719 14.042 -106.03 .965 9.57 -100.479 3.156 6.199 -95.641 -2.719 14.042 -106.03
  [5,24,2.719,14.042,-106.03,.965,9.57,-100.479,3.156,6.199,-95.641,-2.719,14.042,-106.03],
// 5 24 -1.046 9.115 -96.121 1.046 9.115 -96.121 -.917 9.733 -93.933 1.014 9.078 -98.387
  [5,24,-1.046,9.115,-96.121,1.046,9.115,-96.121,-.917,9.733,-93.933,1.014,9.078,-98.387],
// 5 24 1.714 -26.149 -90.227 -1.714 -26.149 -90.227 1.708 -26.248 -89.188 -1.703 -25.795 -90.871
  [5,24,1.714,-26.149,-90.227,-1.714,-26.149,-90.227,1.708,-26.248,-89.188,-1.703,-25.795,-90.871],
// 5 24 -1.703 -25.795 -90.871 1.703 -25.795 -90.871 1.714 -26.149 -90.227 -1.7 -25.298 -91.423
  [5,24,-1.703,-25.795,-90.871,1.703,-25.795,-90.871,1.714,-26.149,-90.227,-1.7,-25.298,-91.423],
// 5 24 1.682 -23.552 -85.833 -1.682 -23.552 -85.833 -1.708 -26.248 -89.188 1.703 -20.521 -81.567
  [5,24,1.682,-23.552,-85.833,-1.682,-23.552,-85.833,-1.708,-26.248,-89.188,1.703,-20.521,-81.567],
// 5 24 1.704 -19.668 -75.209 -1.704 -19.668 -75.209 -1.703 -20.521 -81.567 1.708 -18.16 -63.651
  [5,24,1.704,-19.668,-75.209,-1.704,-19.668,-75.209,-1.703,-20.521,-81.567,1.708,-18.16,-63.651],
// 5 24 1.818 22.208 -117.465 -1.818 22.208 -117.465 -1.963 22.294 -116.059 1.682 21.459 -118.703
  [5,24,1.818,22.208,-117.465,-1.818,22.208,-117.465,-1.963,22.294,-116.059,1.682,21.459,-118.703],
// 5 24 -1.699 -23.427 -31.732 1.699 -23.427 -31.732 1.704 -27.928 -26.341 -1.702 -18.113 -37.916
  [5,24,-1.699,-23.427,-31.732,1.699,-23.427,-31.732,1.704,-27.928,-26.341,-1.702,-18.113,-37.916],
// 5 24 1.647 -16.256 -40.813 -1.647 -16.256 -40.813 1.702 -18.113 -37.916 -1.62 -15.611 -43.32
  [5,24,1.647,-16.256,-40.813,-1.647,-16.256,-40.813,1.702,-18.113,-37.916,-1.62,-15.611,-43.32],
// 5 24 1.653 14.405 -118.528 -1.653 14.405 -118.528 1.684 8.085 -117.488 -1.619 20.176 -119.216
  [5,24,1.653,14.405,-118.528,-1.653,14.405,-118.528,1.684,8.085,-117.488,-1.619,20.176,-119.216],
// 5 24 -1.014 9.078 -98.387 1.014 9.078 -98.387 -1.046 9.115 -96.121 .965 9.57 -100.479
  [5,24,-1.014,9.078,-98.387,1.014,9.078,-98.387,-1.046,9.115,-96.121,.965,9.57,-100.479],
// 5 24 -1.731 9.906 -.289 1.731 9.906 -.289 1.686 10.7 -.922 -1.877 9.019 0
  [5,24,-1.731,9.906,-.289,1.731,9.906,-.289,1.686,10.7,-.922,-1.877,9.019,0],
// 5 24 -3.005 -13.27 0 3.005 -13.27 0 -2.633 -18.605 .037 3.236 -8.703 0
  [5,24,-3.005,-13.27,0,3.005,-13.27,0,-2.633,-18.605,.037,3.236,-8.703,0],
// 5 24 1.877 9.019 0 -1.877 9.019 0 1.731 9.906 -.289 0 6 0
  [5,24,1.877,9.019,0,-1.877,9.019,0,1.731,9.906,-.289,0,6,0],
];
module ldraw_lib__76919(step=0, col=false, unit=2/5, alt=false, line=0.2, solid=!$preview)
    makepoly(ldraw_lib__76919(), step=step, col=col, unit=unit, alt=alt, line=line, solid=solid);
ldraw_lib__76919(line=0.2);
